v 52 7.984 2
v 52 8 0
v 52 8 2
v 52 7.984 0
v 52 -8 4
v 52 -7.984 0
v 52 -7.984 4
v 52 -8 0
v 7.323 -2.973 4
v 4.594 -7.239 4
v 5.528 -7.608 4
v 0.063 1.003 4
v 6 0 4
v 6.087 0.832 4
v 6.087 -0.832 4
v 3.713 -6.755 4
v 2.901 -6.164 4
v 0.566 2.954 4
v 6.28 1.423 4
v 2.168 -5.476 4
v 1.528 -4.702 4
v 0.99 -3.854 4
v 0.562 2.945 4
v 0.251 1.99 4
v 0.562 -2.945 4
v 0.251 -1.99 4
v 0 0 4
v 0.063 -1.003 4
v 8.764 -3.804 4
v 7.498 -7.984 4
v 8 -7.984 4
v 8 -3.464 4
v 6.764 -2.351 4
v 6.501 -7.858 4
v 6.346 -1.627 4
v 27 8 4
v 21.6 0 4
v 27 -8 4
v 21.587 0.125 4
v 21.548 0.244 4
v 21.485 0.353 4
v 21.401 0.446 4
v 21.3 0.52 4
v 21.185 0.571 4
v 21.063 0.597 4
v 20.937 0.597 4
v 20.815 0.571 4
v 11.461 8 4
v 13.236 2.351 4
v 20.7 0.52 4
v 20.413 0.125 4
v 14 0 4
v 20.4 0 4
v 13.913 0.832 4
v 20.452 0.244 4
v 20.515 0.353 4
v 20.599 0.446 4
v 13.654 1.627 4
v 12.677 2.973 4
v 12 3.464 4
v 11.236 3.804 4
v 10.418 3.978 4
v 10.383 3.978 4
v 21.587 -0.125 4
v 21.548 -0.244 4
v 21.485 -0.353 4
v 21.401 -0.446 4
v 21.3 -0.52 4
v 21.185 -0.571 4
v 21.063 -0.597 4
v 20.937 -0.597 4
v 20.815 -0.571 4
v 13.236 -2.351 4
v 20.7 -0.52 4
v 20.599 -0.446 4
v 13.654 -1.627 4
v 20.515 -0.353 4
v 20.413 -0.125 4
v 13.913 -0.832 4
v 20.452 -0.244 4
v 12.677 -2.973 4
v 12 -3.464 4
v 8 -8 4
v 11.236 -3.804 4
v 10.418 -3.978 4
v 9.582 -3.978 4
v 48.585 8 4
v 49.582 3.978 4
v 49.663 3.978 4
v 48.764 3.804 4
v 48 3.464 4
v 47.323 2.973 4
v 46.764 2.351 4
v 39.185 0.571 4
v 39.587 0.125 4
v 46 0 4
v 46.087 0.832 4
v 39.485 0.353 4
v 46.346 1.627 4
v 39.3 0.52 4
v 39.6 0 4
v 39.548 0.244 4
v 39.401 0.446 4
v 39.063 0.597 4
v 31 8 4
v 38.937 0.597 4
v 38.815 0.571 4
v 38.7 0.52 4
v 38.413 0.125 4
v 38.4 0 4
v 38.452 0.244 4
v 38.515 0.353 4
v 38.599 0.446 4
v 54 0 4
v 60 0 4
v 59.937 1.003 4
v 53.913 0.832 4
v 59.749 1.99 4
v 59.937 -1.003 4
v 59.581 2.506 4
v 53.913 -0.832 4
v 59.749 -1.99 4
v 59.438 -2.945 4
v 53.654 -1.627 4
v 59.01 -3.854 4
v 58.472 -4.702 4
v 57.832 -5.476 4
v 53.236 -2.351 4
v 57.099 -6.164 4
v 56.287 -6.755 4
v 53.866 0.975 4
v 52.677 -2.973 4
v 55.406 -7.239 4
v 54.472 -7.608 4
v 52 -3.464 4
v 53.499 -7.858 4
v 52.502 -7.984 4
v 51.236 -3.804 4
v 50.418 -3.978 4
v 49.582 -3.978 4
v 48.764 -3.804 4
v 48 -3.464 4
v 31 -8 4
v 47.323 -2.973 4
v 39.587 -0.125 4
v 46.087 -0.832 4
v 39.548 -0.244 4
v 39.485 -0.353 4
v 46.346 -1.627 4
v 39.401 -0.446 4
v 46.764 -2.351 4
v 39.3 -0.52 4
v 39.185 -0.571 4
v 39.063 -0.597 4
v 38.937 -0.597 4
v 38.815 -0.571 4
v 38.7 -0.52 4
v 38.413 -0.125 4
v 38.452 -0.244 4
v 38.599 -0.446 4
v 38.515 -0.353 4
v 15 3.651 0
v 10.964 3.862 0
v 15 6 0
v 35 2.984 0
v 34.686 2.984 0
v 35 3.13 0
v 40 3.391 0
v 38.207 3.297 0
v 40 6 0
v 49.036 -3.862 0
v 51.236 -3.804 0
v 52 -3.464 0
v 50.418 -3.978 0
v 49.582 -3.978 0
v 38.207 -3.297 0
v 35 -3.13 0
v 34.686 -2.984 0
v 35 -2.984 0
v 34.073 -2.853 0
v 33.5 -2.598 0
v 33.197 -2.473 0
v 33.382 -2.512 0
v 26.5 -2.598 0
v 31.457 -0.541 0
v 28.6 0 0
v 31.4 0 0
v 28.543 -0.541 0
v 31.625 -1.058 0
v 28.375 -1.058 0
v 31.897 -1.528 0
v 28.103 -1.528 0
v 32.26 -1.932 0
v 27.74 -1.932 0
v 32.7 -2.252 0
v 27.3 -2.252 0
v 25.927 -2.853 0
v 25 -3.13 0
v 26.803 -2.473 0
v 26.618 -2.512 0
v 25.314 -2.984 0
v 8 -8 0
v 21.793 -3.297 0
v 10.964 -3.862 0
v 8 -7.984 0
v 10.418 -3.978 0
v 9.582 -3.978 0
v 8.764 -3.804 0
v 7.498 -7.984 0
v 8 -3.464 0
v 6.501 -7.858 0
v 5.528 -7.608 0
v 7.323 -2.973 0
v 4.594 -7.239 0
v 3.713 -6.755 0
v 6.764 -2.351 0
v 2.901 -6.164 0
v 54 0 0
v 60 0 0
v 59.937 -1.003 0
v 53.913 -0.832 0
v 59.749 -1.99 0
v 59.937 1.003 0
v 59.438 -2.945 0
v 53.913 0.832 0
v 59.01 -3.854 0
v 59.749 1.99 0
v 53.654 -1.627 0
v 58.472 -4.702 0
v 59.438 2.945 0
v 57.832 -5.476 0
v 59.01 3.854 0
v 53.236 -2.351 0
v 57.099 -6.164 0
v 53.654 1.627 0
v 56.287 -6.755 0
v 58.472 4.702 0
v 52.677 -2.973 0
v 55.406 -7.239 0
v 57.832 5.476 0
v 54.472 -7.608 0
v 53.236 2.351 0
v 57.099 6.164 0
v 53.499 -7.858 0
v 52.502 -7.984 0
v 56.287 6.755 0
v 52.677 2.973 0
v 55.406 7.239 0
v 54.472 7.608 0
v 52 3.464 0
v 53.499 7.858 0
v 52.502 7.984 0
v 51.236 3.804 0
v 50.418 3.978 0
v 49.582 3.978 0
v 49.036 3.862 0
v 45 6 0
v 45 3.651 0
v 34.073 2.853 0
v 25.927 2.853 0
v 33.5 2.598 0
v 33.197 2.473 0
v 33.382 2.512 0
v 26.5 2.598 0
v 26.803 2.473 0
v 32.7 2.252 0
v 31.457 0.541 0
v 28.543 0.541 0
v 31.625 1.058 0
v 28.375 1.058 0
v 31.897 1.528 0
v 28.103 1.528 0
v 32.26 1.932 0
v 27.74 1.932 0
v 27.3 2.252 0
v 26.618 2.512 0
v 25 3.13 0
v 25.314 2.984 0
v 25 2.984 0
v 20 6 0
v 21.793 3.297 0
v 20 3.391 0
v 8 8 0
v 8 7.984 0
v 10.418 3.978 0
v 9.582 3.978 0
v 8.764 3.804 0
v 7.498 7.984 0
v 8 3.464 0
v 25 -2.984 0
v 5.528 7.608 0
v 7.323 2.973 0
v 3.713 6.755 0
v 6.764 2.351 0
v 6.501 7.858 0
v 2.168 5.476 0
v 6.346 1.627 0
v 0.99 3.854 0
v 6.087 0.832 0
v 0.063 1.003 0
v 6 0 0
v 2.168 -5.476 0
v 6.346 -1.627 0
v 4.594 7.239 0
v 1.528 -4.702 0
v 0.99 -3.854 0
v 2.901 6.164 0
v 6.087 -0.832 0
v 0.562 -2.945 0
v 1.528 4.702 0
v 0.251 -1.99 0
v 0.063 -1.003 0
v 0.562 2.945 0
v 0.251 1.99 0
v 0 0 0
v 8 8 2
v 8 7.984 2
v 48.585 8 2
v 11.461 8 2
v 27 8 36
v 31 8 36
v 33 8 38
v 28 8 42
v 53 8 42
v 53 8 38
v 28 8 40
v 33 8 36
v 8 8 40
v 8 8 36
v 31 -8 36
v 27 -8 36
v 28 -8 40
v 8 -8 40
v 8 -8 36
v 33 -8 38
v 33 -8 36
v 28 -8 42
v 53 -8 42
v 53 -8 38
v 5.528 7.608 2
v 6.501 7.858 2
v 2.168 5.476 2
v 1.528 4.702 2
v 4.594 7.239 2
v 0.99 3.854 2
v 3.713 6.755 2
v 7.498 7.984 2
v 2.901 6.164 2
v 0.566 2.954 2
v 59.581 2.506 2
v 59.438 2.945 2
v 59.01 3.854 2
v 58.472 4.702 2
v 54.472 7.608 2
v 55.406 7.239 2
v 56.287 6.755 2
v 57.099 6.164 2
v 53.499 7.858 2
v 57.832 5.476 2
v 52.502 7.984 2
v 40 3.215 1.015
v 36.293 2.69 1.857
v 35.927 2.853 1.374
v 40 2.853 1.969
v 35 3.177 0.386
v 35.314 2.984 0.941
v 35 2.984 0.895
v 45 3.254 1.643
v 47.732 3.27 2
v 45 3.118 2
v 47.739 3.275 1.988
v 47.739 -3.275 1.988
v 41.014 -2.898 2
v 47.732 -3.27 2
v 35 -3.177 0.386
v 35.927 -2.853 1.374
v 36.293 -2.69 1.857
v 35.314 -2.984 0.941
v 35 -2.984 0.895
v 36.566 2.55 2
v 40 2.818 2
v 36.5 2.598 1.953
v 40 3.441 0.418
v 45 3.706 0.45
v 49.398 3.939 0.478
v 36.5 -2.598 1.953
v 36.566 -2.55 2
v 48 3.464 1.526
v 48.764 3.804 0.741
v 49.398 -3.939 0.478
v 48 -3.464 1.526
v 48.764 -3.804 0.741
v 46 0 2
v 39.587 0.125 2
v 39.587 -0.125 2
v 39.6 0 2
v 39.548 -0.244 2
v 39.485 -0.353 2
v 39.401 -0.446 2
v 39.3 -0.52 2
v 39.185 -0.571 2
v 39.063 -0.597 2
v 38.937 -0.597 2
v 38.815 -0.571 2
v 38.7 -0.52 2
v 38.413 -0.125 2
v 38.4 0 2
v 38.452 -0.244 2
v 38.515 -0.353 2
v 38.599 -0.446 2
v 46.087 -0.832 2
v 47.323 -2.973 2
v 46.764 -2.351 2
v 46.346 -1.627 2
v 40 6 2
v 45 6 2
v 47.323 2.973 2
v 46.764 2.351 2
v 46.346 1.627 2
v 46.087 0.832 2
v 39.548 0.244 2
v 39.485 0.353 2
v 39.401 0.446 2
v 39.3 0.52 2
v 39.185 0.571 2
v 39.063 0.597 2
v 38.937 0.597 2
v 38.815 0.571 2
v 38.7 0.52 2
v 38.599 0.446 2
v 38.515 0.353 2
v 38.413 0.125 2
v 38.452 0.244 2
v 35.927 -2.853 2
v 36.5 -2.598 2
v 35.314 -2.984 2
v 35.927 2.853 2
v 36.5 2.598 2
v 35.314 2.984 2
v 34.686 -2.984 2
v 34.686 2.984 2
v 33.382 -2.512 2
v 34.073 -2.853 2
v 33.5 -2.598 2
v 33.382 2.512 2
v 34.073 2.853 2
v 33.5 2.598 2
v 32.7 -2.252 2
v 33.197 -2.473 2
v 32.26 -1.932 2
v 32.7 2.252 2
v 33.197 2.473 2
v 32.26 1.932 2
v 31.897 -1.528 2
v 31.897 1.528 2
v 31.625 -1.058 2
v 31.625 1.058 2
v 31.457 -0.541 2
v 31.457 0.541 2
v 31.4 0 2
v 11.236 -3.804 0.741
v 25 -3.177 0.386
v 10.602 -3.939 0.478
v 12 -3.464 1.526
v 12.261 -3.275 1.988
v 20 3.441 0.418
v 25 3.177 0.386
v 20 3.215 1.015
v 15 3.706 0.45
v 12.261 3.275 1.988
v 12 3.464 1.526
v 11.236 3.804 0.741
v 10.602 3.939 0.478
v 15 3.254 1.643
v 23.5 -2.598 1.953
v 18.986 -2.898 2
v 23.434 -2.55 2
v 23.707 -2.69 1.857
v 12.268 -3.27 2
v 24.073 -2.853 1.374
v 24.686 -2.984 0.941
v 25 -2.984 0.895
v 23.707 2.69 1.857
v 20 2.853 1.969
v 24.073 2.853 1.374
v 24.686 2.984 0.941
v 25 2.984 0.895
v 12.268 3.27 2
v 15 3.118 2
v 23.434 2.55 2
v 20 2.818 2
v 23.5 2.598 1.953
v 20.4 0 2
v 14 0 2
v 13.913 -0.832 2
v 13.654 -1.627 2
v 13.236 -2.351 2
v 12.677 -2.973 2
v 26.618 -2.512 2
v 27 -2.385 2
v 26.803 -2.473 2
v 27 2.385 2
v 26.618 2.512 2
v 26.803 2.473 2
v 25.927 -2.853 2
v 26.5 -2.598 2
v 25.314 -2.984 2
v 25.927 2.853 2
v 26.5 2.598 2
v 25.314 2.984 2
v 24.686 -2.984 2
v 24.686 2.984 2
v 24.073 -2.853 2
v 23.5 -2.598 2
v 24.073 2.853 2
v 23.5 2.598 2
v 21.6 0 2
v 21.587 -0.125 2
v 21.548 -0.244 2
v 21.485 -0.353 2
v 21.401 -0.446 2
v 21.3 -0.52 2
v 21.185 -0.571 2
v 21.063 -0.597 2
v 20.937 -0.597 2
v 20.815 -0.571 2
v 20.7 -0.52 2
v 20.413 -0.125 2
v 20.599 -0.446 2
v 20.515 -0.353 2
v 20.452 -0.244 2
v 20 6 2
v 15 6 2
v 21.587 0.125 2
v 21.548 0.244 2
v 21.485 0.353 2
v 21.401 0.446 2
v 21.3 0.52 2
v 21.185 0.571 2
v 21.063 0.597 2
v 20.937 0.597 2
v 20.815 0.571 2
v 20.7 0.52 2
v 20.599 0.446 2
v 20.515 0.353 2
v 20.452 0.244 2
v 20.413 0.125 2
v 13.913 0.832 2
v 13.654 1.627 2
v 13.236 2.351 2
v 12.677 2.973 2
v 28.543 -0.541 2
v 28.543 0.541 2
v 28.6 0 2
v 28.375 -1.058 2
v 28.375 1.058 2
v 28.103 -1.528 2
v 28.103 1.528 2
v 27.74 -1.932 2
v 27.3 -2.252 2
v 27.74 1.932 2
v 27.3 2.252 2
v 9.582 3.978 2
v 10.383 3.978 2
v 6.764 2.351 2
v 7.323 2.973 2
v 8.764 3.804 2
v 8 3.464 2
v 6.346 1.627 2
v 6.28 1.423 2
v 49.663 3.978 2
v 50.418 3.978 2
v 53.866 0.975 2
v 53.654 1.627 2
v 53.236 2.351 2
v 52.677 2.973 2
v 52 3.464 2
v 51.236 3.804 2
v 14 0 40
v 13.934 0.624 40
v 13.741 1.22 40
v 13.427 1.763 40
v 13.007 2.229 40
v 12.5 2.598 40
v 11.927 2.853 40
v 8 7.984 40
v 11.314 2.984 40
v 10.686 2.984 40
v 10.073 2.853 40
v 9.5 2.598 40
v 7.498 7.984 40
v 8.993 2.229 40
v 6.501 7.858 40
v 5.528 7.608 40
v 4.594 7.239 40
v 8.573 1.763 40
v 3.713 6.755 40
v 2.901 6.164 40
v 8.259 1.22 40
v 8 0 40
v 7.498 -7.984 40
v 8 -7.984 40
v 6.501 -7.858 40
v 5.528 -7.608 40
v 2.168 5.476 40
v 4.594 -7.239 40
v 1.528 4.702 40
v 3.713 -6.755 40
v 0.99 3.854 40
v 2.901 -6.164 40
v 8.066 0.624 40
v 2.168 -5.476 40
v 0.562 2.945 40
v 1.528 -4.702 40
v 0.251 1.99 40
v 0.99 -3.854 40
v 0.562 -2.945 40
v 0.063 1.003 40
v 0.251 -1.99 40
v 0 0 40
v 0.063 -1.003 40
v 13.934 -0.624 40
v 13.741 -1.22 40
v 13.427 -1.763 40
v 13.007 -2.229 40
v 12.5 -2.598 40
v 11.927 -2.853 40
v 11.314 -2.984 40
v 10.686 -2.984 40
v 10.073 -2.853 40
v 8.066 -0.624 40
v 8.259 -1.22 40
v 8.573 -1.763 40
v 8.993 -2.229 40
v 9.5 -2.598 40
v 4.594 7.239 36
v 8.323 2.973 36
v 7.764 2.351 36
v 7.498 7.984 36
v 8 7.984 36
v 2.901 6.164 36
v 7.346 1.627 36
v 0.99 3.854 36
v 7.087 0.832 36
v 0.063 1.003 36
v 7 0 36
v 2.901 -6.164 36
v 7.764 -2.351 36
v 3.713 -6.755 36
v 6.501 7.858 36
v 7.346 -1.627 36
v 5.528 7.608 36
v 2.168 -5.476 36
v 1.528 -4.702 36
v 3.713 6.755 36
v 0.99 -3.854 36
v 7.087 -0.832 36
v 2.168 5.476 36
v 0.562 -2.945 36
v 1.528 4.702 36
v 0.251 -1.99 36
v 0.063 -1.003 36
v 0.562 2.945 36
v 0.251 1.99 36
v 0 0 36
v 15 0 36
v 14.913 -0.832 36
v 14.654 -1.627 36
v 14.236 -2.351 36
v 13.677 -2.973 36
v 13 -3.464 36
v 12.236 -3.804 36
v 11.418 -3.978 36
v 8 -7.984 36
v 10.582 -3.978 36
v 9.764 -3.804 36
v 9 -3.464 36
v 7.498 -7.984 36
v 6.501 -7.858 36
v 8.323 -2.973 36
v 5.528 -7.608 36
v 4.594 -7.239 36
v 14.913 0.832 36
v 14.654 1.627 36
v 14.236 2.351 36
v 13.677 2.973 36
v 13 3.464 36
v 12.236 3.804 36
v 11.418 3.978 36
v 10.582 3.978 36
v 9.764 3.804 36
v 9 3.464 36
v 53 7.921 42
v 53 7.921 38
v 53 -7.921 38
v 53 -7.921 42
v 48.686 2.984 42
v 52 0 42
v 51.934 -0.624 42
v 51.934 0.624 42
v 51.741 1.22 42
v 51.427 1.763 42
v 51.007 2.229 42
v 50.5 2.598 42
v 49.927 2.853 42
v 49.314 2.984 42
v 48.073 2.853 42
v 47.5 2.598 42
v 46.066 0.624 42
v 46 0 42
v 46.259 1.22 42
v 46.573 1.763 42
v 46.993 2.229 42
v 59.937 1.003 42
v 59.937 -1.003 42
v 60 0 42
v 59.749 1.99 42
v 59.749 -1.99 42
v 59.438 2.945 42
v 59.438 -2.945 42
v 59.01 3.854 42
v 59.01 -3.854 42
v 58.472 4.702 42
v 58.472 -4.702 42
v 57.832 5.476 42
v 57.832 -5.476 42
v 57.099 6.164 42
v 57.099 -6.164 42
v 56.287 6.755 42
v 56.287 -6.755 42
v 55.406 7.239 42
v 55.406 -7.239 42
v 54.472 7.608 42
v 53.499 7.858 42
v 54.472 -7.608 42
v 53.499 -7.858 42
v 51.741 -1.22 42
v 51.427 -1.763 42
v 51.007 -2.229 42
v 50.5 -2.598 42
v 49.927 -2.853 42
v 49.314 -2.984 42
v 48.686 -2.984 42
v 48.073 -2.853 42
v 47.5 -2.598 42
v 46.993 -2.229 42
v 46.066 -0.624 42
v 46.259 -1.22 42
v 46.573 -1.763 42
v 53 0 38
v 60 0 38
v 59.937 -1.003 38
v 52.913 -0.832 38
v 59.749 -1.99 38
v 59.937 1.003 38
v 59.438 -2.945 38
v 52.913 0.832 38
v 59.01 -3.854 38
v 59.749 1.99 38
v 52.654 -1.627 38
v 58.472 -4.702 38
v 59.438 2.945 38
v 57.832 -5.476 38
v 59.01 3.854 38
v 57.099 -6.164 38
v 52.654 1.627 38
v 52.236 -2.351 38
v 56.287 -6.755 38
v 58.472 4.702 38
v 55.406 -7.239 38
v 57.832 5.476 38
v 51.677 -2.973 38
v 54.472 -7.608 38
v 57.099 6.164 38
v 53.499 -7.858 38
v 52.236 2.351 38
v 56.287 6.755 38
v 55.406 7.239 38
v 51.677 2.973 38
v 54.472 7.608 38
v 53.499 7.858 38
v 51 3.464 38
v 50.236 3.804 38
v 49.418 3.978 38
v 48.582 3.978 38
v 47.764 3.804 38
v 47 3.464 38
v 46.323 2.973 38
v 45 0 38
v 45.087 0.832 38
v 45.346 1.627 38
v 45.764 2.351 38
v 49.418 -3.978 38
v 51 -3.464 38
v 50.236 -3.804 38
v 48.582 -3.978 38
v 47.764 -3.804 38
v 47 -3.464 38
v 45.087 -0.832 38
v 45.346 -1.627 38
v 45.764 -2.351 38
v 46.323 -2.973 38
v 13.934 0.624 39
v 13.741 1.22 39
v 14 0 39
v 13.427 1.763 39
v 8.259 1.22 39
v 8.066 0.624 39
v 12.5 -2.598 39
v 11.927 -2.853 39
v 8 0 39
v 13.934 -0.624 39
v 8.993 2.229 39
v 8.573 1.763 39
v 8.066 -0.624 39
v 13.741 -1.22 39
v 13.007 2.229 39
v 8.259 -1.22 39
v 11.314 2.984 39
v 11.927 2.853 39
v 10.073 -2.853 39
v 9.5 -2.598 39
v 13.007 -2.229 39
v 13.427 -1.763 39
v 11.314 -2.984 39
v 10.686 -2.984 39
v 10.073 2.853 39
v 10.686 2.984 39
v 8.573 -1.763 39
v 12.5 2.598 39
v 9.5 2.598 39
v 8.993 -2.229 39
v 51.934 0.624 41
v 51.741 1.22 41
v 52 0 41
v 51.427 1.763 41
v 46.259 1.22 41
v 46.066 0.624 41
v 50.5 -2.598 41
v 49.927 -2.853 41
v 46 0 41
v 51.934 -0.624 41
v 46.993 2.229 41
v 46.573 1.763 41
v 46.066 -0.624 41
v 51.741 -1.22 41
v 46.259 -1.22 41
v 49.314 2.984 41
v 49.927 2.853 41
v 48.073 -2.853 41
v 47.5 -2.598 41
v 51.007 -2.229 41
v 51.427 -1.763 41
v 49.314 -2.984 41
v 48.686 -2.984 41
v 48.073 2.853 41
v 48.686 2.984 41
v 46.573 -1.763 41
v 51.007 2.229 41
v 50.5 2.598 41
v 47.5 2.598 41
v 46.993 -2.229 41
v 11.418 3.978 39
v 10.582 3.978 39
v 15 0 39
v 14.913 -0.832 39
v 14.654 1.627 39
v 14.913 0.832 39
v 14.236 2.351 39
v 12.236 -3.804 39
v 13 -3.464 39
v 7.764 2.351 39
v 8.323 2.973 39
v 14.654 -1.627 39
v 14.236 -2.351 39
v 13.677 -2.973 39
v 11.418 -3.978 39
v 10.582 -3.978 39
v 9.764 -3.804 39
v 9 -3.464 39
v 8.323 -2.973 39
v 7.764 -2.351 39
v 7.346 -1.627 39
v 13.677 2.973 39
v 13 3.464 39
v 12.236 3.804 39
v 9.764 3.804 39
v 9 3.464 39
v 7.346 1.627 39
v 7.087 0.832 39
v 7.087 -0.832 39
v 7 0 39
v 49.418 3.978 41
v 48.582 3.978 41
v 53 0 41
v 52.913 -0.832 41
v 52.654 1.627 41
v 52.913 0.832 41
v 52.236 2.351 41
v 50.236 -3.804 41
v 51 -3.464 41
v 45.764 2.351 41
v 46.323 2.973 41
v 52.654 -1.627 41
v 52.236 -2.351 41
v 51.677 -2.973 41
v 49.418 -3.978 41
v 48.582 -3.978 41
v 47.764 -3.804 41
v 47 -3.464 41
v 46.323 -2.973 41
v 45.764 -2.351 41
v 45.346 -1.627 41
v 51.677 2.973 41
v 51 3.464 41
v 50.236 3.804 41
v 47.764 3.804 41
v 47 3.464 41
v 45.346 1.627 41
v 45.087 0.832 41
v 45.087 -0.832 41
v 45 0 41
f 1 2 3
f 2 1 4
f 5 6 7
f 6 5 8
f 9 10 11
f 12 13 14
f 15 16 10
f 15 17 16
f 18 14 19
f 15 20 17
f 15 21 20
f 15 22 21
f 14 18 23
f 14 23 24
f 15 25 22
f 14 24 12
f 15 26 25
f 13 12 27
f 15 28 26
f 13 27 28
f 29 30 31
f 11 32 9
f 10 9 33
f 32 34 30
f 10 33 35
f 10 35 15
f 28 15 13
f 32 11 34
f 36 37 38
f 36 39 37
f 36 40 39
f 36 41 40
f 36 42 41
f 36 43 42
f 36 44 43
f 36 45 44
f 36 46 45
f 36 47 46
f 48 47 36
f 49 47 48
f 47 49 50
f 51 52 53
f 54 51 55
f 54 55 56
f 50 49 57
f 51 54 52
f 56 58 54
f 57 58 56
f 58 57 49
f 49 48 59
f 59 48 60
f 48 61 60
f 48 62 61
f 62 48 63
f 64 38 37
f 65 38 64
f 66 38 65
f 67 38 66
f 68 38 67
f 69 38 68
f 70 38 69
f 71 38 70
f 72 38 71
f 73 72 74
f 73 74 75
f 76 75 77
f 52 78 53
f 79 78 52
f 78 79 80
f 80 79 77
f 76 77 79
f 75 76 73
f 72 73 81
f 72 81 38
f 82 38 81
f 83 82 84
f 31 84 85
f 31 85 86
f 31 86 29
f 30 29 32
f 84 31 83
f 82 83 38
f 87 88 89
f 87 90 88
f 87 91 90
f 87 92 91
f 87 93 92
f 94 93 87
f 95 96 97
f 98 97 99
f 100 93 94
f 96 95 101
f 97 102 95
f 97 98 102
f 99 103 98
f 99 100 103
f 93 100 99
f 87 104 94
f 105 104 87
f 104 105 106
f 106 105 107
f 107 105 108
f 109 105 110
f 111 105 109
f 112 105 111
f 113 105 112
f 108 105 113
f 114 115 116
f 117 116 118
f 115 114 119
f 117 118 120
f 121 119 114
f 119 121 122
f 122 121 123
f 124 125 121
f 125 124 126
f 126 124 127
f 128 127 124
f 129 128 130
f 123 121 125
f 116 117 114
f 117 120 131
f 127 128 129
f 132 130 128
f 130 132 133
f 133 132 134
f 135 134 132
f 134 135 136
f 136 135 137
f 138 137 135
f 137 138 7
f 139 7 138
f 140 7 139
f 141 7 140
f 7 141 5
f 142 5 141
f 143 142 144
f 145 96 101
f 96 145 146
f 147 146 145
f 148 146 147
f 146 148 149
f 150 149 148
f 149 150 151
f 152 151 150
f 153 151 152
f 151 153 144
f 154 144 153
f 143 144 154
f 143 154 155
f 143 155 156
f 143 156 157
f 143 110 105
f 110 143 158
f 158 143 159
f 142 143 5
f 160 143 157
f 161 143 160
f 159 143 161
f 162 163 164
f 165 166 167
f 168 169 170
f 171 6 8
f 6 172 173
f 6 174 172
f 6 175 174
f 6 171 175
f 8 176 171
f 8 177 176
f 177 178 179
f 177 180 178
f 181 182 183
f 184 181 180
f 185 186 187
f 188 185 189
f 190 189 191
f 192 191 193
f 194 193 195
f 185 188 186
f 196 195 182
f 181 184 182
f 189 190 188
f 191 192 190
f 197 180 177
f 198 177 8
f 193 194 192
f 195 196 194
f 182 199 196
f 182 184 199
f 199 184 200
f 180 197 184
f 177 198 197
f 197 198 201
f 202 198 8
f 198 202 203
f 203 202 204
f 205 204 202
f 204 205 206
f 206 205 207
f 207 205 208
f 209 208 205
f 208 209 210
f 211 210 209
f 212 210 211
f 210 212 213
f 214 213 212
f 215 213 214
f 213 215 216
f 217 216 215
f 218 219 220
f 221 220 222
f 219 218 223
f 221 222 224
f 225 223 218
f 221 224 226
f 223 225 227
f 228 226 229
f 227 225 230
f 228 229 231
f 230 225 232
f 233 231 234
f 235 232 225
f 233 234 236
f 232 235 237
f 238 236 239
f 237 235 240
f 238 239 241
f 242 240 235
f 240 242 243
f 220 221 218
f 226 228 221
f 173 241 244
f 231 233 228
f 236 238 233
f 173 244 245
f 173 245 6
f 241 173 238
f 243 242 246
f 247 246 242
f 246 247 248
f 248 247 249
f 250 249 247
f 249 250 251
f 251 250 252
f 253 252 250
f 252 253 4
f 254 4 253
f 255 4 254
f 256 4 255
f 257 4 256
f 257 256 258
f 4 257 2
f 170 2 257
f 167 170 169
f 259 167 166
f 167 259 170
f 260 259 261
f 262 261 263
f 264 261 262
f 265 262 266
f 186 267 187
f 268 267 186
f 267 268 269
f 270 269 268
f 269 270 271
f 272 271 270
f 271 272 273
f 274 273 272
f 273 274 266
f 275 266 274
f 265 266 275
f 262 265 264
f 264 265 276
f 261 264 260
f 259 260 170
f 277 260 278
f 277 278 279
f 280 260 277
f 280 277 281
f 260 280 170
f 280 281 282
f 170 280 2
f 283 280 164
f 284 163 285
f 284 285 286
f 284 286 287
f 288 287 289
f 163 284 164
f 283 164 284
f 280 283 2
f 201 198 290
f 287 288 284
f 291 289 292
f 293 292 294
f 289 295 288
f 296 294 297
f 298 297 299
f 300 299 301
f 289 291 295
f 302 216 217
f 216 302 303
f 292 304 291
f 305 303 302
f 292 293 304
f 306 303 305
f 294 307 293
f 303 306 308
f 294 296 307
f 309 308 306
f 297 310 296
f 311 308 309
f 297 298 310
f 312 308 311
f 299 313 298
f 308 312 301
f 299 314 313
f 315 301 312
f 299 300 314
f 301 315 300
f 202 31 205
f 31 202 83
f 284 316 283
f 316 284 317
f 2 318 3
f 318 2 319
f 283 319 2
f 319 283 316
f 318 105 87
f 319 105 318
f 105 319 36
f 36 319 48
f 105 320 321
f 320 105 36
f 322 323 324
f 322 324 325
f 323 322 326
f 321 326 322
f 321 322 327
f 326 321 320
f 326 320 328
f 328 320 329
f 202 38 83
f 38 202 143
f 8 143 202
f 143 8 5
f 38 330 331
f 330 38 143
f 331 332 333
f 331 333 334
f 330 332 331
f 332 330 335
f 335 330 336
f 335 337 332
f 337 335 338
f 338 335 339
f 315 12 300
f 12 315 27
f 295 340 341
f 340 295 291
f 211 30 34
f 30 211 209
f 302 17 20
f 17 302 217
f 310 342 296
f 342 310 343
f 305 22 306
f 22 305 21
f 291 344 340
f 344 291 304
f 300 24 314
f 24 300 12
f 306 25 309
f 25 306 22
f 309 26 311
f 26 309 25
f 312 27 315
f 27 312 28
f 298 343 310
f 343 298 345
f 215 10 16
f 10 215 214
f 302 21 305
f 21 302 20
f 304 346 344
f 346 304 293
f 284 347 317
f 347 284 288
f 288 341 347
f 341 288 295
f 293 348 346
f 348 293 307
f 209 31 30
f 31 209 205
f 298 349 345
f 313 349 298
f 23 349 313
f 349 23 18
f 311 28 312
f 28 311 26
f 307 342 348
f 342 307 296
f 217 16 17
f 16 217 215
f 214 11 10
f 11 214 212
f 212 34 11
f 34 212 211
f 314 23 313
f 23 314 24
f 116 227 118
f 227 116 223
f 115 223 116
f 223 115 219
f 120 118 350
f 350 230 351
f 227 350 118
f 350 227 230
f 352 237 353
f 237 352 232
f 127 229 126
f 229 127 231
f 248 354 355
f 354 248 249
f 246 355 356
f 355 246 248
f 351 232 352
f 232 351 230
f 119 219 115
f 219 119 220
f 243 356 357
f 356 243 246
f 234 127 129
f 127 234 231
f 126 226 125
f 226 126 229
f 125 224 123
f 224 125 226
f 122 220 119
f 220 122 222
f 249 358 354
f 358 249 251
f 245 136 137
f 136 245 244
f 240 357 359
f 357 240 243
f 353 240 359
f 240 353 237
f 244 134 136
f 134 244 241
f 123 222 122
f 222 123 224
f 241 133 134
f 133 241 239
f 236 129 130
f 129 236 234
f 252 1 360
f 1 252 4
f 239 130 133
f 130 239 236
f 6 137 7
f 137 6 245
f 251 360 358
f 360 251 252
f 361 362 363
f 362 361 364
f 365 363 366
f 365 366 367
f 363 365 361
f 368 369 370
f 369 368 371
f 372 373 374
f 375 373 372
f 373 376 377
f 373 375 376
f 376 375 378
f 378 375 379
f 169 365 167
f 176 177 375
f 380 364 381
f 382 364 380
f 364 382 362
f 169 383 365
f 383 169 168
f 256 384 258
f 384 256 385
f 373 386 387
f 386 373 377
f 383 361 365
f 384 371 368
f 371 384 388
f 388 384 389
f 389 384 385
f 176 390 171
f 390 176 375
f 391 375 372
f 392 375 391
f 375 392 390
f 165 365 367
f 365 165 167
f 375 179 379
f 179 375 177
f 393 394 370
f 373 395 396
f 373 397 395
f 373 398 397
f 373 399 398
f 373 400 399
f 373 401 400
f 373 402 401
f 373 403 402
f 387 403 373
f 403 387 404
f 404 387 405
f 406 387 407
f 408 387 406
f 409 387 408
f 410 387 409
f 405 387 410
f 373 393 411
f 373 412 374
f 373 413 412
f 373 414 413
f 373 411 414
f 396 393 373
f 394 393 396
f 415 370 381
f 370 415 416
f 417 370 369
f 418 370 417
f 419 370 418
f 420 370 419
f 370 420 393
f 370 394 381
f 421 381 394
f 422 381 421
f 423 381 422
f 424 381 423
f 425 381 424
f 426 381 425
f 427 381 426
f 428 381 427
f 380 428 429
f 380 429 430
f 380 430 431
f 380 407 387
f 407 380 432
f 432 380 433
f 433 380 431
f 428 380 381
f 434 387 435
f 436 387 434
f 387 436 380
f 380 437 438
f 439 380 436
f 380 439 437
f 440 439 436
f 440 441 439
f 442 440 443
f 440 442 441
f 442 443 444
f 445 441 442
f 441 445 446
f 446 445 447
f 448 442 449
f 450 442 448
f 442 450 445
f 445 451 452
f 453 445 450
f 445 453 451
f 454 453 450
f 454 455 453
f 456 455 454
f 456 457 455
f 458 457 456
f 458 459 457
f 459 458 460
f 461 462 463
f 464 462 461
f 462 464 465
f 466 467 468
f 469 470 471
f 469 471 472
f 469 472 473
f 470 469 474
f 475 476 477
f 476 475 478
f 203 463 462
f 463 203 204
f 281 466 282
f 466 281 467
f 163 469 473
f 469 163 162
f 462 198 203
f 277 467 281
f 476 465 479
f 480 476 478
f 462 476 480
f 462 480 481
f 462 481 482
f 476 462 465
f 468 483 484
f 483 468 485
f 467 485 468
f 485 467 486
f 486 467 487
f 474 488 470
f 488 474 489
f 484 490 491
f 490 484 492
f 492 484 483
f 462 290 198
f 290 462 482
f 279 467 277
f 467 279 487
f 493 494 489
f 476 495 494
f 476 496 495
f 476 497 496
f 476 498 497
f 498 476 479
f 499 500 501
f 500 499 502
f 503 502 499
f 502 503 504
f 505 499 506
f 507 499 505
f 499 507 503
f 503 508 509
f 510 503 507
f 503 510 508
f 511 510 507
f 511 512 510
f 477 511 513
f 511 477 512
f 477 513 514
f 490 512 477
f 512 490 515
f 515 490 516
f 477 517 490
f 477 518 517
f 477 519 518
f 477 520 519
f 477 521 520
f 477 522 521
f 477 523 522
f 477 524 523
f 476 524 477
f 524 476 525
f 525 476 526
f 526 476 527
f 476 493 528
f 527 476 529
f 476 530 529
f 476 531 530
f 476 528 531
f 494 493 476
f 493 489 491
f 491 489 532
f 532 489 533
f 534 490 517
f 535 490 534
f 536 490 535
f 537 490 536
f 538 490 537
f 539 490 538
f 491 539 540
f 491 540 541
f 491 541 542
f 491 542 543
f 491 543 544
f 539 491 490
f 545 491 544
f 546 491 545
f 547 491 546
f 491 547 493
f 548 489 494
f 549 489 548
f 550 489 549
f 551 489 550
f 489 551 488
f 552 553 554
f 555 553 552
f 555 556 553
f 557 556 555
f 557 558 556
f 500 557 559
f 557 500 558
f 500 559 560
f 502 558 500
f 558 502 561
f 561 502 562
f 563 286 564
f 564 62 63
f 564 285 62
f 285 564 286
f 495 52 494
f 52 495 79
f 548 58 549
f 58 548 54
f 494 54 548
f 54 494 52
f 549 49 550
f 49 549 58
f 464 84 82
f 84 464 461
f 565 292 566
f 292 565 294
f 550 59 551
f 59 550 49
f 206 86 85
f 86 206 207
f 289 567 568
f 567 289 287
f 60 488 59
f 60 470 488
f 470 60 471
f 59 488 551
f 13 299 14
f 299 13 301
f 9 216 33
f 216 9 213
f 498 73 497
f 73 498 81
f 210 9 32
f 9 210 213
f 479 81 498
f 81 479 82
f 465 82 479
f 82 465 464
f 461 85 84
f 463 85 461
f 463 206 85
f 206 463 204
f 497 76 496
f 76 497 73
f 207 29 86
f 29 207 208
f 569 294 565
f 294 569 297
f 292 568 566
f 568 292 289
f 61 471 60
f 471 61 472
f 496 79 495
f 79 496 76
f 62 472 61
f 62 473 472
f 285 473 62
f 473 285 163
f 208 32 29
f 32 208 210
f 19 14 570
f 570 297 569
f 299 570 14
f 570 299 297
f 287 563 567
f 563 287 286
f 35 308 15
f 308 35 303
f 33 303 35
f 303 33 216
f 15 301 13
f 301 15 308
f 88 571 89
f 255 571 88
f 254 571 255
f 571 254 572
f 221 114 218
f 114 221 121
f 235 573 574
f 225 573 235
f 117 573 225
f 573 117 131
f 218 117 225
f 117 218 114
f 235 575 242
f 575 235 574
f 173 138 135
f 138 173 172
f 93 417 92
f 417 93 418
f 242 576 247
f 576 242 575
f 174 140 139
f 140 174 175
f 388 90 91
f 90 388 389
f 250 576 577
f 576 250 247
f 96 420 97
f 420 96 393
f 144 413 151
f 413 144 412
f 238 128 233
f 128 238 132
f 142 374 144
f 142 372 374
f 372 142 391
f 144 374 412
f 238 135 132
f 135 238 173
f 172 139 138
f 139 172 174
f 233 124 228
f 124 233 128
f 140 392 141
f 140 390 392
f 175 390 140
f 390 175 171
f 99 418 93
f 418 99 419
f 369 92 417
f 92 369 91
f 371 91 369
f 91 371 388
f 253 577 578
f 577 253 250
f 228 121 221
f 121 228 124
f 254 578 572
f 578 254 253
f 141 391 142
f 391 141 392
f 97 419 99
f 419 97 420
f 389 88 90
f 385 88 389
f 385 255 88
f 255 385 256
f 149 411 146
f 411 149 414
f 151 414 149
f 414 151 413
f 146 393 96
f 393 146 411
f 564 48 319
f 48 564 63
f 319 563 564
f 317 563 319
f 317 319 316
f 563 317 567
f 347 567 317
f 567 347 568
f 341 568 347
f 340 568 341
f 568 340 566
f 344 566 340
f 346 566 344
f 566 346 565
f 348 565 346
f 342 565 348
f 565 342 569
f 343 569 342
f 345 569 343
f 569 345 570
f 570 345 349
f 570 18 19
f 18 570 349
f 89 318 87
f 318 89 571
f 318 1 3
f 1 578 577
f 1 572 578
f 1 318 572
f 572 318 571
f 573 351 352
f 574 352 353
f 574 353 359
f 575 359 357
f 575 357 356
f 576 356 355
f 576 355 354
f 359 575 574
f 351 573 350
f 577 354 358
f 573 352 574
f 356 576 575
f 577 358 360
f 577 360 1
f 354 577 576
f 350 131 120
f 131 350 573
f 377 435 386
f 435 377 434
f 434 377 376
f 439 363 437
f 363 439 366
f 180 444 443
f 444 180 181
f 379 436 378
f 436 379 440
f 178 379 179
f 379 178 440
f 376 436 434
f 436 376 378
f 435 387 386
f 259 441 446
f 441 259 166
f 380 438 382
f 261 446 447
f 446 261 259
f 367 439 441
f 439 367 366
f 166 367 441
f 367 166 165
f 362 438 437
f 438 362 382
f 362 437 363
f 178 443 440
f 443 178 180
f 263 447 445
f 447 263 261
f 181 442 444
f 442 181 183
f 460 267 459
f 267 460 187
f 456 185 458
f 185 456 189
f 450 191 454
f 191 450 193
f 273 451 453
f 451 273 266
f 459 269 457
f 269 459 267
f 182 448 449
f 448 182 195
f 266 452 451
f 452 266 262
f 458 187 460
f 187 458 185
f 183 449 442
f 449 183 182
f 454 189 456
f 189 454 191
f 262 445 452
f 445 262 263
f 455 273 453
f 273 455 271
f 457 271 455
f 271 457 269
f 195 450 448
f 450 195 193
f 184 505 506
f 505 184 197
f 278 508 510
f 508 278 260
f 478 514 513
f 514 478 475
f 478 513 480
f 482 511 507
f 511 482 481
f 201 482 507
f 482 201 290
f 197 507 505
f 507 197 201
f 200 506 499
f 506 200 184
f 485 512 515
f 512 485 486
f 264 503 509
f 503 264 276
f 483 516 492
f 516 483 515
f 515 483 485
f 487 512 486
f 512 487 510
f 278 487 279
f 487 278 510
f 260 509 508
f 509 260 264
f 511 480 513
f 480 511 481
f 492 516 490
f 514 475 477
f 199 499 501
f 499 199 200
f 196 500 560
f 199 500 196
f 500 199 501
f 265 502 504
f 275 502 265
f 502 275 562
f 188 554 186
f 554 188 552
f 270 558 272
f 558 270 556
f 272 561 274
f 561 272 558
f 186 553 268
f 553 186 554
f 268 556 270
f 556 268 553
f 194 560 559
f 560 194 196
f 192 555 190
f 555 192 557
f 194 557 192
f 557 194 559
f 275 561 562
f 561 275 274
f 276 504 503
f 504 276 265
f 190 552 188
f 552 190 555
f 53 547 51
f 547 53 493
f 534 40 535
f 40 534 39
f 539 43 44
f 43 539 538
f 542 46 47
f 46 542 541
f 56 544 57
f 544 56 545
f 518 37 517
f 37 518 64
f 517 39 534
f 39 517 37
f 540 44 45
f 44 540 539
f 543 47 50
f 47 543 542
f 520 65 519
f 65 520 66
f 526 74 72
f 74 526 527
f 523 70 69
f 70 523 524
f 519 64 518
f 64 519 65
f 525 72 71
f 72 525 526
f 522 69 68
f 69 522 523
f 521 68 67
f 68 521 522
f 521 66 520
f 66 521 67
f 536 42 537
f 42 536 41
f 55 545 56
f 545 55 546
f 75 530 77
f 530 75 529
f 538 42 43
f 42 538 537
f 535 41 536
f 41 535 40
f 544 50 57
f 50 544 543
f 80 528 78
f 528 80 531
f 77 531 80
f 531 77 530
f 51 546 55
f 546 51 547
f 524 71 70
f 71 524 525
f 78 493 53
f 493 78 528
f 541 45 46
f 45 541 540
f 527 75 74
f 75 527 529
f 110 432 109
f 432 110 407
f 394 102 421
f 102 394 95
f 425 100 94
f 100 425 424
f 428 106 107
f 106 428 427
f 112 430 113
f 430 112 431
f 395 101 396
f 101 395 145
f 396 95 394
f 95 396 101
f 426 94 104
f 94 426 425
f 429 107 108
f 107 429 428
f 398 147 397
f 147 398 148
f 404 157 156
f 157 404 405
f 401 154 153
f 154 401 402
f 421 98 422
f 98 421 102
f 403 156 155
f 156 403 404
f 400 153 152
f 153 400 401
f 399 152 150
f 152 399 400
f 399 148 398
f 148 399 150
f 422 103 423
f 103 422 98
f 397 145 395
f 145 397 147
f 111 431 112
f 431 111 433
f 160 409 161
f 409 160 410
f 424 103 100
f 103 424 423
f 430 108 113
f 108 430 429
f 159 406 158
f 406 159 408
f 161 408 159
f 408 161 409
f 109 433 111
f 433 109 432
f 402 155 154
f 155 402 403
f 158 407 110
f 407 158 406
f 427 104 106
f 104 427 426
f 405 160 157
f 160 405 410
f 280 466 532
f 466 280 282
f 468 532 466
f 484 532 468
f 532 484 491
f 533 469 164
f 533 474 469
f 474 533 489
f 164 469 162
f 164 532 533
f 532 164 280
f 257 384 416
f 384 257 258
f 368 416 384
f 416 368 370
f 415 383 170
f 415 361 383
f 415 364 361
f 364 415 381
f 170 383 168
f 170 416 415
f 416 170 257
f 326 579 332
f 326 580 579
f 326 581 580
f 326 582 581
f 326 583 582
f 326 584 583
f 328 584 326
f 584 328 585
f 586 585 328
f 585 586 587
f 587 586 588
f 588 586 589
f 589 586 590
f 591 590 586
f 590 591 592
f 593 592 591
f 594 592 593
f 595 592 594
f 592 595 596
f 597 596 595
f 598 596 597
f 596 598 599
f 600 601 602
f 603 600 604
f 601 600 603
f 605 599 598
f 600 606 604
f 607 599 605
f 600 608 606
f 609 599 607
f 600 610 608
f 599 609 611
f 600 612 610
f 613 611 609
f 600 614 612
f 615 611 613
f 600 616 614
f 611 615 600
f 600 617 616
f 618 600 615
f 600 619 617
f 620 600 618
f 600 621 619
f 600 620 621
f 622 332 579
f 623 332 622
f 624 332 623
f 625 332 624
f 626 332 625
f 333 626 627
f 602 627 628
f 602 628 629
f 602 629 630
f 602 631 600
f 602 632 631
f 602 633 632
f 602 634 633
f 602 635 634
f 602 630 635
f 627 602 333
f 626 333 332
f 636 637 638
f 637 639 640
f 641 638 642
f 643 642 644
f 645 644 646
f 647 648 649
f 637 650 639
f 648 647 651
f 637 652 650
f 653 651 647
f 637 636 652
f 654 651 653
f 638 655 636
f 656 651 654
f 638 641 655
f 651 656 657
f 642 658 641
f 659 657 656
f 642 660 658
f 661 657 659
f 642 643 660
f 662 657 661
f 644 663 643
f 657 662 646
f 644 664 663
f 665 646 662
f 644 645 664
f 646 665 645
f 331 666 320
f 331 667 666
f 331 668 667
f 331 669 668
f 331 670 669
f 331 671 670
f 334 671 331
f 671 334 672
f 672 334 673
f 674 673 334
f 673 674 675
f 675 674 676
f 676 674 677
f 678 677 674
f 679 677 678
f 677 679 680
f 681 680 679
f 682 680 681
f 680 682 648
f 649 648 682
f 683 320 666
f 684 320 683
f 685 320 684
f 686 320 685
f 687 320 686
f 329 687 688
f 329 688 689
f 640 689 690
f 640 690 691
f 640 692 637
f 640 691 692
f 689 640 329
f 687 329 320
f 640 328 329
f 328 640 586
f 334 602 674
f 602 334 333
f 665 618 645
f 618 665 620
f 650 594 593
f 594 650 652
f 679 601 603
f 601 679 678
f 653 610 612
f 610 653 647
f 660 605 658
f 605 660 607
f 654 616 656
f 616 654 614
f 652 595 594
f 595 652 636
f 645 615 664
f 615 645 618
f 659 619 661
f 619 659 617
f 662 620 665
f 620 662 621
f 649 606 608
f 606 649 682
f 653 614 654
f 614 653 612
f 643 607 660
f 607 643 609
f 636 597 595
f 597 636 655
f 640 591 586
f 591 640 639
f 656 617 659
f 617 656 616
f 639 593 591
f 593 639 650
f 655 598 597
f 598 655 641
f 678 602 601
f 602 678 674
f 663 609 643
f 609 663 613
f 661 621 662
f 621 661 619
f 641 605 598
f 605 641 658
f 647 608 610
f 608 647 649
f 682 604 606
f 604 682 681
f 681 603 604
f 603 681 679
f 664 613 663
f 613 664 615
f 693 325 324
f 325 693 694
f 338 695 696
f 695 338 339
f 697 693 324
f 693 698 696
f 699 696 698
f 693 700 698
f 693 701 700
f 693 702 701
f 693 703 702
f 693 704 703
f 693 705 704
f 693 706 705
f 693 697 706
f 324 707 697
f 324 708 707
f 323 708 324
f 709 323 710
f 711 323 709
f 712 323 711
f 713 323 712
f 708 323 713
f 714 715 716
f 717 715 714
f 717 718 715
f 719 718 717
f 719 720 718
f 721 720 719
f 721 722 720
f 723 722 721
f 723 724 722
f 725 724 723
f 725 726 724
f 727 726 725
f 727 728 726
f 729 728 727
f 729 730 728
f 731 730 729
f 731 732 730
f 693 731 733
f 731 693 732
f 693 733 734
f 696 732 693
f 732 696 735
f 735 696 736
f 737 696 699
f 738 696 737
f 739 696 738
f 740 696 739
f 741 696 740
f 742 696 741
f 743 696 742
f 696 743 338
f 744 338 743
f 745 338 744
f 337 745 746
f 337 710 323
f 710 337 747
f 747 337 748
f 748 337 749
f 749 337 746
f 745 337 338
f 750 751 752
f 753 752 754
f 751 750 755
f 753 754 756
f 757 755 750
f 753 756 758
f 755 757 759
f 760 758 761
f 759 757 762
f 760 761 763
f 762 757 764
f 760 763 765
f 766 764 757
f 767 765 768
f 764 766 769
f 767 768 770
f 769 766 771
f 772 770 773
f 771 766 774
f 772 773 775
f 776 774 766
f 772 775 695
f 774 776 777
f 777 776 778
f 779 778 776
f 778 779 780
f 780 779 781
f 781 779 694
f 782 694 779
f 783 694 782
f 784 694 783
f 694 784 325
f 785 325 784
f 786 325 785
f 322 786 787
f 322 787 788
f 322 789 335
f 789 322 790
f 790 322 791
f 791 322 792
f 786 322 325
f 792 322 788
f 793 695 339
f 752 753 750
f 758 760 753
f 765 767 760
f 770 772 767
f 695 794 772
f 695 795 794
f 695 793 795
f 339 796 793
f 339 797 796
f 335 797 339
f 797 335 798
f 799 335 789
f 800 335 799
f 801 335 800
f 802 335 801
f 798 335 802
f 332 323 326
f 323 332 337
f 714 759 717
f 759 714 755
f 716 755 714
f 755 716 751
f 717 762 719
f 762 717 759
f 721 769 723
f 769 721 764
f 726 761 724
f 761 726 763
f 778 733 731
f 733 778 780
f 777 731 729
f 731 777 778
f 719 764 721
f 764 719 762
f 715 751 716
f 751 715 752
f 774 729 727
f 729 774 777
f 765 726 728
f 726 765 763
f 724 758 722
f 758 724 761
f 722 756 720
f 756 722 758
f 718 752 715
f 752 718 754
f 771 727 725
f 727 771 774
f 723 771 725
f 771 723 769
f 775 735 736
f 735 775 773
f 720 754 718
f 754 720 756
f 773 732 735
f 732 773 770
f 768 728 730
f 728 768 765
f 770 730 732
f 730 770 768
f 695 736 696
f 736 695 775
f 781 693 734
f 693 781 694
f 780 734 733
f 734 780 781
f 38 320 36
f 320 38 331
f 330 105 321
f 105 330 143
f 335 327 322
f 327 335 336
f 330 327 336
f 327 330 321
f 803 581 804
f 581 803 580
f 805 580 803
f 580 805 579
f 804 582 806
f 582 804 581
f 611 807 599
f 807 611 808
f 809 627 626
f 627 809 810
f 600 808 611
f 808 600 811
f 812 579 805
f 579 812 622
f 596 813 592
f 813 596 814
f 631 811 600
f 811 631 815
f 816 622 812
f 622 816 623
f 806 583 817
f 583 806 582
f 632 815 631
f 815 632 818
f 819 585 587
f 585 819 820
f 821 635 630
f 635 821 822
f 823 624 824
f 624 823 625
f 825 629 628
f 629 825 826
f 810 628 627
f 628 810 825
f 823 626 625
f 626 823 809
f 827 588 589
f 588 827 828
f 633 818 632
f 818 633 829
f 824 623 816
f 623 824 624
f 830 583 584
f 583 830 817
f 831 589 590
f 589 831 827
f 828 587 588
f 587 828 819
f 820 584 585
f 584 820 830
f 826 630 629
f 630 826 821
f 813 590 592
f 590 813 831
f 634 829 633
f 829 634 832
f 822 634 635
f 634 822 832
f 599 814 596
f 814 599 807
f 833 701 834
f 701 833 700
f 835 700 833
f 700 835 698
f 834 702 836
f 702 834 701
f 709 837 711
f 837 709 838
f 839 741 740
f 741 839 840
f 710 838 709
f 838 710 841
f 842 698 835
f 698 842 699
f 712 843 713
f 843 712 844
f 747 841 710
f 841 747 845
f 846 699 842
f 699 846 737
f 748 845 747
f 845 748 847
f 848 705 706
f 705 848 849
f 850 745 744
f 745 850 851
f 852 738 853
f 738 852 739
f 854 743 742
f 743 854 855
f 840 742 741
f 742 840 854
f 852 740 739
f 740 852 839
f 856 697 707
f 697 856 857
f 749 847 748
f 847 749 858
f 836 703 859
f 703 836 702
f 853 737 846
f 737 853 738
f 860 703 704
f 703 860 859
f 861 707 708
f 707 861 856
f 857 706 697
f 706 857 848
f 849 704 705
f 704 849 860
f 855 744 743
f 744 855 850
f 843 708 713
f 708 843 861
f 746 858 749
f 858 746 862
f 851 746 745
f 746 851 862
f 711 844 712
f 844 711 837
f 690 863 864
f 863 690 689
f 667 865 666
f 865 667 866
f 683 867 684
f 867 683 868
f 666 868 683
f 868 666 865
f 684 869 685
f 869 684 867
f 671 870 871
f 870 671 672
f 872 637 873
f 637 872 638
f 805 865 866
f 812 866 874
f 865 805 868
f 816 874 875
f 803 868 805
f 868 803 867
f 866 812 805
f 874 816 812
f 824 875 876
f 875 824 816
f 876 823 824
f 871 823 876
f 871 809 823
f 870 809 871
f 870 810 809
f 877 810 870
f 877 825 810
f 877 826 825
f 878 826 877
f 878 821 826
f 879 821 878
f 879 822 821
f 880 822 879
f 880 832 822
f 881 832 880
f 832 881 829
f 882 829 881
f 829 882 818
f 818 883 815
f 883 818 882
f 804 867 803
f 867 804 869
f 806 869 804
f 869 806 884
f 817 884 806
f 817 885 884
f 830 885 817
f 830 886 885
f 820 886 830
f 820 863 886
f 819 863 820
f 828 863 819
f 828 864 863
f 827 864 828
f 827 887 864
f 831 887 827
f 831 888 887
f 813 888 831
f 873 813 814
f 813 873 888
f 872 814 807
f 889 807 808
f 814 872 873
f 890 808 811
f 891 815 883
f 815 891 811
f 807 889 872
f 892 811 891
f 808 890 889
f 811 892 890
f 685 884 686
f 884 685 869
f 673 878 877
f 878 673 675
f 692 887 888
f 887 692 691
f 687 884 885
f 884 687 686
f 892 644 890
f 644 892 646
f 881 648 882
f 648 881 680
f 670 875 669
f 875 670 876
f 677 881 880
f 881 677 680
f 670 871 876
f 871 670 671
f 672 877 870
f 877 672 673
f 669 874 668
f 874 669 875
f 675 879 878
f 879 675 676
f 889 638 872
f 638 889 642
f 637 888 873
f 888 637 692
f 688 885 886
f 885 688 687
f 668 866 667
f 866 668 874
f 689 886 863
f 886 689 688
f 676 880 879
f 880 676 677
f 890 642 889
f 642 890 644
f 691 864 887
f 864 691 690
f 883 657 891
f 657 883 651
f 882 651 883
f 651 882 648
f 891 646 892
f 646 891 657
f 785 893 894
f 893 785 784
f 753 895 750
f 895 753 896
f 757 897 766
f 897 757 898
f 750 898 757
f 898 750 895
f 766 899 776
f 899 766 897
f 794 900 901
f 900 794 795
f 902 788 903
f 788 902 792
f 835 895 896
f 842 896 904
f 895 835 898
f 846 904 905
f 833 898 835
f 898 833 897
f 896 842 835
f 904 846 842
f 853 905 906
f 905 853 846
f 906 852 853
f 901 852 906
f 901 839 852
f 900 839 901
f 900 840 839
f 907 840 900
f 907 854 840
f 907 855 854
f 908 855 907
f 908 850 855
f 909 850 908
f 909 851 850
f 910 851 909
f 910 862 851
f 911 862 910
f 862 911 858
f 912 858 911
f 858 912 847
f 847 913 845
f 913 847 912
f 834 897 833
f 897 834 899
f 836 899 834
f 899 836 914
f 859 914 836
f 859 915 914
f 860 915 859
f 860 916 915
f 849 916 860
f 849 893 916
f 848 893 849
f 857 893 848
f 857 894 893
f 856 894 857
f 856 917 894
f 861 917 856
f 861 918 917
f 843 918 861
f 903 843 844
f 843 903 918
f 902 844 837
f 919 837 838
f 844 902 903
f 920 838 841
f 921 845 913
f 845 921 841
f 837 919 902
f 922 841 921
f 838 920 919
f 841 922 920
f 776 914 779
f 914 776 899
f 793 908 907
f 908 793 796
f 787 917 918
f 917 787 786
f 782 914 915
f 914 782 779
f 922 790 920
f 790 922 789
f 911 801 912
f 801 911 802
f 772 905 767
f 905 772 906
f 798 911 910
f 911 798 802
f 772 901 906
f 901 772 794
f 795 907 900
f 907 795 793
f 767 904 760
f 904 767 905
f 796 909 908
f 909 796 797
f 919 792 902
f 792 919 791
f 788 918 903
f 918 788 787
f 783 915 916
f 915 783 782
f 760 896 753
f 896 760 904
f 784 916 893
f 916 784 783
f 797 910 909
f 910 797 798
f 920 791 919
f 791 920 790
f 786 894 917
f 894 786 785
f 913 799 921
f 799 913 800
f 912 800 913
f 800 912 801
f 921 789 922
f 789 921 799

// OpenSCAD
// Vasen (左)

// Alaosa
difference(){
    union(){
        translate([8,-8,0]) cube([44,16,4]);
        translate([8,0,0])cylinder(h=4,d=16,$fn=50);
        translate([52,0,0]) cylinder(h=4,d=16,$fn=50);
    }
    
    // Kiinnitysreiät
    translate([10,0,-1]) cylinder(h=6,d=8,$fn=30);
    translate([50,0,-1]) cylinder(h=6,d=8,$fn=30);
    rotate([0,0,-15]) translate([-1,3,2]) cube([10,10,3]);
    rotate([0,0,15]) translate([49,-13,2]) cube([10,10,3]);
    
    // Servon kiinnitysreiät
    intersection() {
        rotate([0,-90,0])translate([0,0,-50]) cylinder(h=15,r1=4,r2=3.2);
        translate([31,-7,0]) cube([20,15,2]);
    }
    translate([35,0,0]) cylinder(h=2,r=3,$fn=30);
    translate([34,0,0]) cylinder(h=2,r=2.6,$fn=30);
    
    intersection() {
        rotate([0,-90,0])translate([0,0,-25]) cylinder(h=15,r1=3.2,r2=4);
        translate([10,-7,0]) cube([20,15,2]);
    }
    translate([25,0,0]) cylinder(h=2,r=3,$fn=30);
    translate([26,0,0]) cylinder(h=2,r=2.6,$fn=30);
    
    // Ruuviaukot
    translate([21,0,-1]) cylinder(h=6,r=0.6,$fn=30);
    translate([39,0,-1]) cylinder(h=6,r=0.6,$fn=30);
    
    // Ottoaukot
    translate([15,2,0]) cube([5,4,2]);
    translate([40,2,0]) cube([5,4,2]);
}

// Yläosa
difference(){
    union(){
        translate([8,-8,36]) cube([22,16,4]);
        translate([8,0,36]) cylinder(h=4,d=16,$fn=50);
    
        translate([28,-8,38]) cube([25,16,4]);
        translate([52,0,38]) cylinder(h=4,d=16,$fn=50);
        
        // Hylly
        rotate([0,0,90])translate([-8,-31,2])cube([16,4,37]);
        translate([31,-8,36]) cube([2,16,2]);
    }
    
    // Kiinnitysreiät
    translate([11,0,35]) cylinder(h=6,d=6,$fn=30);
    translate([49,0,37]) cylinder(h=6,d=6,$fn=30);
    translate([11,0,35]) cylinder(h=4,d=8,$fn=30);
    translate([49,0,37]) cylinder(h=4,d=8,$fn=30);
}
